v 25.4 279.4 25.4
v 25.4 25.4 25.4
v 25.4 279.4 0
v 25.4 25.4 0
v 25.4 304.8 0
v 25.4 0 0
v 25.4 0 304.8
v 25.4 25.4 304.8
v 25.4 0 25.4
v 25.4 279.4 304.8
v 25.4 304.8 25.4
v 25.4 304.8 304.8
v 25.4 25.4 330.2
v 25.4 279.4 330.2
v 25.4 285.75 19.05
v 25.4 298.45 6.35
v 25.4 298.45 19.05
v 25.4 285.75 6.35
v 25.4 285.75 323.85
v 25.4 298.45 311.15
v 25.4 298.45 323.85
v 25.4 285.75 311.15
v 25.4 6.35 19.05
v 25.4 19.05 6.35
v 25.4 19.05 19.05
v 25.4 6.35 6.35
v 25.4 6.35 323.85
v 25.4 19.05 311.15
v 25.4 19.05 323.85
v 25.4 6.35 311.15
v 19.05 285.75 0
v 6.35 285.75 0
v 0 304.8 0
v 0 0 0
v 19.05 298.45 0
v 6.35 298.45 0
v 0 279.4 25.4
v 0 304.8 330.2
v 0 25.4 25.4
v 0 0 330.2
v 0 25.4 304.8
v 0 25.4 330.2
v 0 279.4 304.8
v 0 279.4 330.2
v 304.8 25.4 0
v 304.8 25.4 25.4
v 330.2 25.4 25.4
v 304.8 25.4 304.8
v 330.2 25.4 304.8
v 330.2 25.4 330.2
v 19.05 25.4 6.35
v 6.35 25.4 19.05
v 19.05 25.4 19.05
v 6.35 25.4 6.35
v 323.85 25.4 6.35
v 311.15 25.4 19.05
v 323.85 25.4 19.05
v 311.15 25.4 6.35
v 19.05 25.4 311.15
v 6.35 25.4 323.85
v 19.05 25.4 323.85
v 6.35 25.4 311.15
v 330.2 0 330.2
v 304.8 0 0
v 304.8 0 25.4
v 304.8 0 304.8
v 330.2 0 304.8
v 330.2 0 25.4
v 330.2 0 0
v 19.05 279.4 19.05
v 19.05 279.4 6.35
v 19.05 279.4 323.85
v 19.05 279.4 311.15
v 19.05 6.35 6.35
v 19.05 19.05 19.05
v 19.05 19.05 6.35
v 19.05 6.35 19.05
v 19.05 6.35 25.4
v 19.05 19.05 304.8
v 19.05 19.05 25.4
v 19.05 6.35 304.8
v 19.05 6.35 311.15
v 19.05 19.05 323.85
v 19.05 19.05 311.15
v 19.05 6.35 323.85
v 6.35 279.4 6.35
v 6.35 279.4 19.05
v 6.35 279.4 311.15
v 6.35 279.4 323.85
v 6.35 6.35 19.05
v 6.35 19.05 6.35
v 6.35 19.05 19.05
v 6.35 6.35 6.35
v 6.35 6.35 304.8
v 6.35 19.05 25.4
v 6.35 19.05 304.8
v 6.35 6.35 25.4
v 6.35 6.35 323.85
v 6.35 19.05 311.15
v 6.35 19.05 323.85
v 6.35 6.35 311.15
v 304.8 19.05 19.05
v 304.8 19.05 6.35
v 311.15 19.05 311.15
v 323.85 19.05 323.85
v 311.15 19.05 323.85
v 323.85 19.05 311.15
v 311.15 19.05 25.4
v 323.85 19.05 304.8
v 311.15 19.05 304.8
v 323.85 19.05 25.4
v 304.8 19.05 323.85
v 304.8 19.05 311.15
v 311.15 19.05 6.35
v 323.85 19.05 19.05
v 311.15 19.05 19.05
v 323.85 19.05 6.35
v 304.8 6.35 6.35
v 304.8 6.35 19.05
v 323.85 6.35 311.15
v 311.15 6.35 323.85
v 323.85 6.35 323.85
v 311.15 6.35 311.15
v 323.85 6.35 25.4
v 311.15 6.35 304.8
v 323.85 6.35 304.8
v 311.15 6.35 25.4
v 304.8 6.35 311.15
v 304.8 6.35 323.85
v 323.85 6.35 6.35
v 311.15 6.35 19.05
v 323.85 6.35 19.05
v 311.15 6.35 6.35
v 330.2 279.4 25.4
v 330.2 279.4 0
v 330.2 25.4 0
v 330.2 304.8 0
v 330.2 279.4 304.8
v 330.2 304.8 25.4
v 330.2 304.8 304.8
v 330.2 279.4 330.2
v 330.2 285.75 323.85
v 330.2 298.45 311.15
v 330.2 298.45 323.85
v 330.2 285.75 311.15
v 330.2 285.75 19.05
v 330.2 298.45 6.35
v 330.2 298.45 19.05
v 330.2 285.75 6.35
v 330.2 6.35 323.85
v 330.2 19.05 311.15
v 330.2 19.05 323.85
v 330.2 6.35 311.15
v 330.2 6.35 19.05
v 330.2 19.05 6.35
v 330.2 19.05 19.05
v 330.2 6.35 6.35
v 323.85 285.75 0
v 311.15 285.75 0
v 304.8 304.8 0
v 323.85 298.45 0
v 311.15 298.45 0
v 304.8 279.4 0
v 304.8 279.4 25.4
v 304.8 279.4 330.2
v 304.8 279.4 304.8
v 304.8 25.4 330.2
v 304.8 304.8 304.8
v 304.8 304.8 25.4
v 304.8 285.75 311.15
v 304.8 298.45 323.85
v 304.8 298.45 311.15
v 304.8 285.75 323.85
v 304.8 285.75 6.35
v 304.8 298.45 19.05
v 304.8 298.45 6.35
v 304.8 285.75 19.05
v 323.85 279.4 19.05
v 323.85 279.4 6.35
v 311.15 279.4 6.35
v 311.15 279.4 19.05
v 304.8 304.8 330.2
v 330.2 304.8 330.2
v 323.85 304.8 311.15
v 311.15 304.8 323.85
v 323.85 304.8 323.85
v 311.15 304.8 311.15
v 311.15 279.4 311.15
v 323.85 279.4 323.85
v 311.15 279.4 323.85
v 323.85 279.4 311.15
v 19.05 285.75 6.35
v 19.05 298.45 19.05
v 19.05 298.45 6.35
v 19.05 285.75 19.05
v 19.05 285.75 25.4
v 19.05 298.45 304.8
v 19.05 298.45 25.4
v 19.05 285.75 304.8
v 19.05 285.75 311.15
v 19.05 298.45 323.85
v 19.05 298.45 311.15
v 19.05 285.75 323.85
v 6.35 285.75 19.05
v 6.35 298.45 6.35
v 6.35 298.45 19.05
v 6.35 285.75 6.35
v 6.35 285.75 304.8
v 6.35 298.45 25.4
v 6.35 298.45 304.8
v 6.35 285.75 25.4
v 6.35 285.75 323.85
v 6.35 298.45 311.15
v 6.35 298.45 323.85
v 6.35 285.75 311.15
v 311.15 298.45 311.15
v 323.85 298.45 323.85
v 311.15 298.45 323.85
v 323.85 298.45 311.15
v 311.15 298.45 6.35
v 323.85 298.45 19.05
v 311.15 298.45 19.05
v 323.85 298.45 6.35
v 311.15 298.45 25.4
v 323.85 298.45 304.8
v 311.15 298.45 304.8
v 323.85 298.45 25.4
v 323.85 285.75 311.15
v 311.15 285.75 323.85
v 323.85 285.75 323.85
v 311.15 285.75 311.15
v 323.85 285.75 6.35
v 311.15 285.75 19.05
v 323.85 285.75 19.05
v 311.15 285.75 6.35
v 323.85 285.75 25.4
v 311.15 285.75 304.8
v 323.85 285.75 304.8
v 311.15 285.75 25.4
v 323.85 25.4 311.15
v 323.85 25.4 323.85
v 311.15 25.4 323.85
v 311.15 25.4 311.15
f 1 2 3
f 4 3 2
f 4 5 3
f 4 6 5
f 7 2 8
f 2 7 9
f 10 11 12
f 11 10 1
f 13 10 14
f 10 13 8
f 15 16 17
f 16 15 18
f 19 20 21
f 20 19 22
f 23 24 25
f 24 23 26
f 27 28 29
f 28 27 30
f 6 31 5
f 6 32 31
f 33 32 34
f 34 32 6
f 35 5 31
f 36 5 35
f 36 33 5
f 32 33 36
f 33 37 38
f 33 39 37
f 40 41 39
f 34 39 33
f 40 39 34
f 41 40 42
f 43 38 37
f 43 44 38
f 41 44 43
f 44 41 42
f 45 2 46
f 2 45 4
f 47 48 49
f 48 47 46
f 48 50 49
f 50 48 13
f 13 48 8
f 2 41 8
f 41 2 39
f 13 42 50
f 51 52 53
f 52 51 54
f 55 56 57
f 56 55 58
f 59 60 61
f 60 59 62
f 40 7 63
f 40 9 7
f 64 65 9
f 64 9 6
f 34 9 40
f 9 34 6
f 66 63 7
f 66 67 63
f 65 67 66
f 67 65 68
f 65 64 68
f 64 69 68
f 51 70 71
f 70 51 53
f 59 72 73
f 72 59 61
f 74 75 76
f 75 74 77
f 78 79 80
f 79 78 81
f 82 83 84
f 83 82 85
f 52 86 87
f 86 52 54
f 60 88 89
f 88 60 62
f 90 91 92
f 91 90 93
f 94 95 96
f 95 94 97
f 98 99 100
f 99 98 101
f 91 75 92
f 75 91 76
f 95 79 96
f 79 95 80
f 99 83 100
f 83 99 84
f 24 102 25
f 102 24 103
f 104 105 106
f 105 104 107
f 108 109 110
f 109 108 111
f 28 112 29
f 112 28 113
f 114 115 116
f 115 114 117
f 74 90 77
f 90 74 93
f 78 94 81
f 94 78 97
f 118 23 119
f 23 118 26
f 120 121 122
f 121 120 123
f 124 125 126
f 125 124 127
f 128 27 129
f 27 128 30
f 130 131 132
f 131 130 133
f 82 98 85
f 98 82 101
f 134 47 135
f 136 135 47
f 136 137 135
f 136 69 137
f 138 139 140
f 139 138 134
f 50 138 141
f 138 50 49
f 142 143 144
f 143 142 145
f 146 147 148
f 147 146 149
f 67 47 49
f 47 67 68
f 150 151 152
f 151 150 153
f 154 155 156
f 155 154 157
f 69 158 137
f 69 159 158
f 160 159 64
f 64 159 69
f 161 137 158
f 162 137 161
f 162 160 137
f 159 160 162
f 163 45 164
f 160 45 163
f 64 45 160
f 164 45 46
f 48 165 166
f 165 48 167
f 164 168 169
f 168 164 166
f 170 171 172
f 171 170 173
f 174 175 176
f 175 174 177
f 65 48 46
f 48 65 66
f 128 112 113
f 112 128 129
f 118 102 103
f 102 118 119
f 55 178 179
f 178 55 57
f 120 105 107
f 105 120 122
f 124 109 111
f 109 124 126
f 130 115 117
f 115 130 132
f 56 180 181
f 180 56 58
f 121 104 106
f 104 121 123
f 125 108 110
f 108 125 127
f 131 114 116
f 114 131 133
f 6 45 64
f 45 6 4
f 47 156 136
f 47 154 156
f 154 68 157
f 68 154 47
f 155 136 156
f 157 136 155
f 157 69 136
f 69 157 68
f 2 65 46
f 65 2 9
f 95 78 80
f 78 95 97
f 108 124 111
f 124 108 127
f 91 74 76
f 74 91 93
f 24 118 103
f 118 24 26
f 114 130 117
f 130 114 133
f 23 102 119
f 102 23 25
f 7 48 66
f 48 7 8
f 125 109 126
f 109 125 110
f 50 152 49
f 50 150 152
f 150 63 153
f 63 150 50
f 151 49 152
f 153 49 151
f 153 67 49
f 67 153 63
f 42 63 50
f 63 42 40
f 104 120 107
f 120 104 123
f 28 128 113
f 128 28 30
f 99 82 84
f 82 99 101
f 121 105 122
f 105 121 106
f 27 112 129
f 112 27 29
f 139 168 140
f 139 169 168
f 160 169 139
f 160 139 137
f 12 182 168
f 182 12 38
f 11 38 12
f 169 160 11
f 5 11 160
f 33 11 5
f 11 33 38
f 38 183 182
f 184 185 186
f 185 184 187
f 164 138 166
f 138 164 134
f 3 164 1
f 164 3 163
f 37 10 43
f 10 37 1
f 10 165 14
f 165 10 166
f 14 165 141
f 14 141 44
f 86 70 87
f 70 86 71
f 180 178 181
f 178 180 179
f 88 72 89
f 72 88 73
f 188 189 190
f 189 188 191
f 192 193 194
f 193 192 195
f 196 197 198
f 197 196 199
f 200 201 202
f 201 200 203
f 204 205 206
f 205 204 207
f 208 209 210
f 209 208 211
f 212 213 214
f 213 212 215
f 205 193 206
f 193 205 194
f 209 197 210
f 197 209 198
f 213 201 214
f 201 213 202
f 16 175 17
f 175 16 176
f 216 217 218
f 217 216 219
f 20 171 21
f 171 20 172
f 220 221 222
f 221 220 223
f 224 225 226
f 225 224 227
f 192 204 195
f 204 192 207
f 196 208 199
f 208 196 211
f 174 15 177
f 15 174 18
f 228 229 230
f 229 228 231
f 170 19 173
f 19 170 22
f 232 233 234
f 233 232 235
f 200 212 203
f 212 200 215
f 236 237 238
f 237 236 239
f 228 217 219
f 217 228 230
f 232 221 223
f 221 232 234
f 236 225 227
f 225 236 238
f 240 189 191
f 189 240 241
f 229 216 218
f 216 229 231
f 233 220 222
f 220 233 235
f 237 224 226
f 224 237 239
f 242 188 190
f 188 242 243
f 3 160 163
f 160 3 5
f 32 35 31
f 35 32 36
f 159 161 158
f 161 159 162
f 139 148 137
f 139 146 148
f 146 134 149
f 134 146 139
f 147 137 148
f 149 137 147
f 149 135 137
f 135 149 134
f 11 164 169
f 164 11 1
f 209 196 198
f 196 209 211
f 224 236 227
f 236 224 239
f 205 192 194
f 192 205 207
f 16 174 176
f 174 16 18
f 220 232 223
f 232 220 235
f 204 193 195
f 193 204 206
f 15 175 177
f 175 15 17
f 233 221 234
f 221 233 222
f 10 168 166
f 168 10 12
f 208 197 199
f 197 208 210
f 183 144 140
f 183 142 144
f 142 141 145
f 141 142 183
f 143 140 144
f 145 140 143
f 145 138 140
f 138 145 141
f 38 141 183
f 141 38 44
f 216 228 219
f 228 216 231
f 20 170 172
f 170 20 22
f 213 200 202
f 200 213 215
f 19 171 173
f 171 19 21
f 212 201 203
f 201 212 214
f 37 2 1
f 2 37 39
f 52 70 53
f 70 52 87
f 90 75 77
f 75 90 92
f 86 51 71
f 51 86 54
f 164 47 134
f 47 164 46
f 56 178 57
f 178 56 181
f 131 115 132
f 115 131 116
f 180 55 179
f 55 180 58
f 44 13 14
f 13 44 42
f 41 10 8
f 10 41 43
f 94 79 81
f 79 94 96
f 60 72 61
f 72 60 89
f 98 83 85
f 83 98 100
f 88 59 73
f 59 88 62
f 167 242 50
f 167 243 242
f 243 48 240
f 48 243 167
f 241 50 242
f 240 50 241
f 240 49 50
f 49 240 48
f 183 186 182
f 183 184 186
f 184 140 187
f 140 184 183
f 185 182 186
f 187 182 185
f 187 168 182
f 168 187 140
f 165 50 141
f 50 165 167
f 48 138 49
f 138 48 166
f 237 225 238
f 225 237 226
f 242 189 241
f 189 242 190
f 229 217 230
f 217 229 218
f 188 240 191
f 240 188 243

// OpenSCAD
// file: square_tube.scad
// Function to create a hollow square tube (wireframe edge)
module square_tube(length, OD, wall_thickness) {
    difference() {
        // Outer square tube (solid)
        cube([OD, OD, length], center=false);
        
        // Inner hollow cutout (subtracts from outer)
        translate([wall_thickness, wall_thickness, 0])
            cube([OD - 2 * wall_thickness, OD - 2 * wall_thickness, length], center=false);
    }
}
// main file
// Convert inches to millimeters
inch = 25.4;
OD = 1 * inch;        // Outer dimension (OD) of 1 inch for the wireframe tubes
crate_width = 13 * inch;   // 13 inch width
crate_length = 13 * inch;  // 13 inch length
crate_height = 11 * inch;  // 11 inch height
wall_thickness = 1/4 * inch;  // Thickness of the wireframe bars



use <square_tube.scad>;  // Import the square_tube module from square_tube.scad

module square_base(x,y,z) {
    translate([x, y, z]) square_tube(crate_length, OD, wall_thickness);
    translate([x + crate_length - OD, y, z]) square_tube(crate_width, OD, wall_thickness);
    translate([x, y, z + OD]) rotate([0,90,0]) square_tube(crate_length, OD, wall_thickness);
    translate([x,y,z+crate_width]) rotate([0,90,0]) square_tube(crate_width, OD, wall_thickness);
}

// Function to generate the wireframe of a cube
module crate() {

    // Bottom square
    square_base(0,0,0);

    // Top square
    square_base(0,crate_width-2*OD,0);

    // Vertical edges (from bottom to top)
    translate([0, crate_length-2*OD, 0]) rotate([90, 0, 0]) square_tube(crate_height, OD, wall_thickness);
    translate([crate_length - OD, crate_length-2*OD, 0]) rotate([90, 0, 0]) square_tube(crate_height, OD, wall_thickness);
    translate([0, crate_length-2*OD, crate_length-OD]) rotate([90, 0, 0]) square_tube(crate_height, OD, wall_thickness);
    translate([crate_length - OD, crate_length-OD, crate_length-OD]) rotate([90, 0, 0]) square_tube(crate_height, OD, wall_thickness);


}

// Call the wireframe crate module
crate();
